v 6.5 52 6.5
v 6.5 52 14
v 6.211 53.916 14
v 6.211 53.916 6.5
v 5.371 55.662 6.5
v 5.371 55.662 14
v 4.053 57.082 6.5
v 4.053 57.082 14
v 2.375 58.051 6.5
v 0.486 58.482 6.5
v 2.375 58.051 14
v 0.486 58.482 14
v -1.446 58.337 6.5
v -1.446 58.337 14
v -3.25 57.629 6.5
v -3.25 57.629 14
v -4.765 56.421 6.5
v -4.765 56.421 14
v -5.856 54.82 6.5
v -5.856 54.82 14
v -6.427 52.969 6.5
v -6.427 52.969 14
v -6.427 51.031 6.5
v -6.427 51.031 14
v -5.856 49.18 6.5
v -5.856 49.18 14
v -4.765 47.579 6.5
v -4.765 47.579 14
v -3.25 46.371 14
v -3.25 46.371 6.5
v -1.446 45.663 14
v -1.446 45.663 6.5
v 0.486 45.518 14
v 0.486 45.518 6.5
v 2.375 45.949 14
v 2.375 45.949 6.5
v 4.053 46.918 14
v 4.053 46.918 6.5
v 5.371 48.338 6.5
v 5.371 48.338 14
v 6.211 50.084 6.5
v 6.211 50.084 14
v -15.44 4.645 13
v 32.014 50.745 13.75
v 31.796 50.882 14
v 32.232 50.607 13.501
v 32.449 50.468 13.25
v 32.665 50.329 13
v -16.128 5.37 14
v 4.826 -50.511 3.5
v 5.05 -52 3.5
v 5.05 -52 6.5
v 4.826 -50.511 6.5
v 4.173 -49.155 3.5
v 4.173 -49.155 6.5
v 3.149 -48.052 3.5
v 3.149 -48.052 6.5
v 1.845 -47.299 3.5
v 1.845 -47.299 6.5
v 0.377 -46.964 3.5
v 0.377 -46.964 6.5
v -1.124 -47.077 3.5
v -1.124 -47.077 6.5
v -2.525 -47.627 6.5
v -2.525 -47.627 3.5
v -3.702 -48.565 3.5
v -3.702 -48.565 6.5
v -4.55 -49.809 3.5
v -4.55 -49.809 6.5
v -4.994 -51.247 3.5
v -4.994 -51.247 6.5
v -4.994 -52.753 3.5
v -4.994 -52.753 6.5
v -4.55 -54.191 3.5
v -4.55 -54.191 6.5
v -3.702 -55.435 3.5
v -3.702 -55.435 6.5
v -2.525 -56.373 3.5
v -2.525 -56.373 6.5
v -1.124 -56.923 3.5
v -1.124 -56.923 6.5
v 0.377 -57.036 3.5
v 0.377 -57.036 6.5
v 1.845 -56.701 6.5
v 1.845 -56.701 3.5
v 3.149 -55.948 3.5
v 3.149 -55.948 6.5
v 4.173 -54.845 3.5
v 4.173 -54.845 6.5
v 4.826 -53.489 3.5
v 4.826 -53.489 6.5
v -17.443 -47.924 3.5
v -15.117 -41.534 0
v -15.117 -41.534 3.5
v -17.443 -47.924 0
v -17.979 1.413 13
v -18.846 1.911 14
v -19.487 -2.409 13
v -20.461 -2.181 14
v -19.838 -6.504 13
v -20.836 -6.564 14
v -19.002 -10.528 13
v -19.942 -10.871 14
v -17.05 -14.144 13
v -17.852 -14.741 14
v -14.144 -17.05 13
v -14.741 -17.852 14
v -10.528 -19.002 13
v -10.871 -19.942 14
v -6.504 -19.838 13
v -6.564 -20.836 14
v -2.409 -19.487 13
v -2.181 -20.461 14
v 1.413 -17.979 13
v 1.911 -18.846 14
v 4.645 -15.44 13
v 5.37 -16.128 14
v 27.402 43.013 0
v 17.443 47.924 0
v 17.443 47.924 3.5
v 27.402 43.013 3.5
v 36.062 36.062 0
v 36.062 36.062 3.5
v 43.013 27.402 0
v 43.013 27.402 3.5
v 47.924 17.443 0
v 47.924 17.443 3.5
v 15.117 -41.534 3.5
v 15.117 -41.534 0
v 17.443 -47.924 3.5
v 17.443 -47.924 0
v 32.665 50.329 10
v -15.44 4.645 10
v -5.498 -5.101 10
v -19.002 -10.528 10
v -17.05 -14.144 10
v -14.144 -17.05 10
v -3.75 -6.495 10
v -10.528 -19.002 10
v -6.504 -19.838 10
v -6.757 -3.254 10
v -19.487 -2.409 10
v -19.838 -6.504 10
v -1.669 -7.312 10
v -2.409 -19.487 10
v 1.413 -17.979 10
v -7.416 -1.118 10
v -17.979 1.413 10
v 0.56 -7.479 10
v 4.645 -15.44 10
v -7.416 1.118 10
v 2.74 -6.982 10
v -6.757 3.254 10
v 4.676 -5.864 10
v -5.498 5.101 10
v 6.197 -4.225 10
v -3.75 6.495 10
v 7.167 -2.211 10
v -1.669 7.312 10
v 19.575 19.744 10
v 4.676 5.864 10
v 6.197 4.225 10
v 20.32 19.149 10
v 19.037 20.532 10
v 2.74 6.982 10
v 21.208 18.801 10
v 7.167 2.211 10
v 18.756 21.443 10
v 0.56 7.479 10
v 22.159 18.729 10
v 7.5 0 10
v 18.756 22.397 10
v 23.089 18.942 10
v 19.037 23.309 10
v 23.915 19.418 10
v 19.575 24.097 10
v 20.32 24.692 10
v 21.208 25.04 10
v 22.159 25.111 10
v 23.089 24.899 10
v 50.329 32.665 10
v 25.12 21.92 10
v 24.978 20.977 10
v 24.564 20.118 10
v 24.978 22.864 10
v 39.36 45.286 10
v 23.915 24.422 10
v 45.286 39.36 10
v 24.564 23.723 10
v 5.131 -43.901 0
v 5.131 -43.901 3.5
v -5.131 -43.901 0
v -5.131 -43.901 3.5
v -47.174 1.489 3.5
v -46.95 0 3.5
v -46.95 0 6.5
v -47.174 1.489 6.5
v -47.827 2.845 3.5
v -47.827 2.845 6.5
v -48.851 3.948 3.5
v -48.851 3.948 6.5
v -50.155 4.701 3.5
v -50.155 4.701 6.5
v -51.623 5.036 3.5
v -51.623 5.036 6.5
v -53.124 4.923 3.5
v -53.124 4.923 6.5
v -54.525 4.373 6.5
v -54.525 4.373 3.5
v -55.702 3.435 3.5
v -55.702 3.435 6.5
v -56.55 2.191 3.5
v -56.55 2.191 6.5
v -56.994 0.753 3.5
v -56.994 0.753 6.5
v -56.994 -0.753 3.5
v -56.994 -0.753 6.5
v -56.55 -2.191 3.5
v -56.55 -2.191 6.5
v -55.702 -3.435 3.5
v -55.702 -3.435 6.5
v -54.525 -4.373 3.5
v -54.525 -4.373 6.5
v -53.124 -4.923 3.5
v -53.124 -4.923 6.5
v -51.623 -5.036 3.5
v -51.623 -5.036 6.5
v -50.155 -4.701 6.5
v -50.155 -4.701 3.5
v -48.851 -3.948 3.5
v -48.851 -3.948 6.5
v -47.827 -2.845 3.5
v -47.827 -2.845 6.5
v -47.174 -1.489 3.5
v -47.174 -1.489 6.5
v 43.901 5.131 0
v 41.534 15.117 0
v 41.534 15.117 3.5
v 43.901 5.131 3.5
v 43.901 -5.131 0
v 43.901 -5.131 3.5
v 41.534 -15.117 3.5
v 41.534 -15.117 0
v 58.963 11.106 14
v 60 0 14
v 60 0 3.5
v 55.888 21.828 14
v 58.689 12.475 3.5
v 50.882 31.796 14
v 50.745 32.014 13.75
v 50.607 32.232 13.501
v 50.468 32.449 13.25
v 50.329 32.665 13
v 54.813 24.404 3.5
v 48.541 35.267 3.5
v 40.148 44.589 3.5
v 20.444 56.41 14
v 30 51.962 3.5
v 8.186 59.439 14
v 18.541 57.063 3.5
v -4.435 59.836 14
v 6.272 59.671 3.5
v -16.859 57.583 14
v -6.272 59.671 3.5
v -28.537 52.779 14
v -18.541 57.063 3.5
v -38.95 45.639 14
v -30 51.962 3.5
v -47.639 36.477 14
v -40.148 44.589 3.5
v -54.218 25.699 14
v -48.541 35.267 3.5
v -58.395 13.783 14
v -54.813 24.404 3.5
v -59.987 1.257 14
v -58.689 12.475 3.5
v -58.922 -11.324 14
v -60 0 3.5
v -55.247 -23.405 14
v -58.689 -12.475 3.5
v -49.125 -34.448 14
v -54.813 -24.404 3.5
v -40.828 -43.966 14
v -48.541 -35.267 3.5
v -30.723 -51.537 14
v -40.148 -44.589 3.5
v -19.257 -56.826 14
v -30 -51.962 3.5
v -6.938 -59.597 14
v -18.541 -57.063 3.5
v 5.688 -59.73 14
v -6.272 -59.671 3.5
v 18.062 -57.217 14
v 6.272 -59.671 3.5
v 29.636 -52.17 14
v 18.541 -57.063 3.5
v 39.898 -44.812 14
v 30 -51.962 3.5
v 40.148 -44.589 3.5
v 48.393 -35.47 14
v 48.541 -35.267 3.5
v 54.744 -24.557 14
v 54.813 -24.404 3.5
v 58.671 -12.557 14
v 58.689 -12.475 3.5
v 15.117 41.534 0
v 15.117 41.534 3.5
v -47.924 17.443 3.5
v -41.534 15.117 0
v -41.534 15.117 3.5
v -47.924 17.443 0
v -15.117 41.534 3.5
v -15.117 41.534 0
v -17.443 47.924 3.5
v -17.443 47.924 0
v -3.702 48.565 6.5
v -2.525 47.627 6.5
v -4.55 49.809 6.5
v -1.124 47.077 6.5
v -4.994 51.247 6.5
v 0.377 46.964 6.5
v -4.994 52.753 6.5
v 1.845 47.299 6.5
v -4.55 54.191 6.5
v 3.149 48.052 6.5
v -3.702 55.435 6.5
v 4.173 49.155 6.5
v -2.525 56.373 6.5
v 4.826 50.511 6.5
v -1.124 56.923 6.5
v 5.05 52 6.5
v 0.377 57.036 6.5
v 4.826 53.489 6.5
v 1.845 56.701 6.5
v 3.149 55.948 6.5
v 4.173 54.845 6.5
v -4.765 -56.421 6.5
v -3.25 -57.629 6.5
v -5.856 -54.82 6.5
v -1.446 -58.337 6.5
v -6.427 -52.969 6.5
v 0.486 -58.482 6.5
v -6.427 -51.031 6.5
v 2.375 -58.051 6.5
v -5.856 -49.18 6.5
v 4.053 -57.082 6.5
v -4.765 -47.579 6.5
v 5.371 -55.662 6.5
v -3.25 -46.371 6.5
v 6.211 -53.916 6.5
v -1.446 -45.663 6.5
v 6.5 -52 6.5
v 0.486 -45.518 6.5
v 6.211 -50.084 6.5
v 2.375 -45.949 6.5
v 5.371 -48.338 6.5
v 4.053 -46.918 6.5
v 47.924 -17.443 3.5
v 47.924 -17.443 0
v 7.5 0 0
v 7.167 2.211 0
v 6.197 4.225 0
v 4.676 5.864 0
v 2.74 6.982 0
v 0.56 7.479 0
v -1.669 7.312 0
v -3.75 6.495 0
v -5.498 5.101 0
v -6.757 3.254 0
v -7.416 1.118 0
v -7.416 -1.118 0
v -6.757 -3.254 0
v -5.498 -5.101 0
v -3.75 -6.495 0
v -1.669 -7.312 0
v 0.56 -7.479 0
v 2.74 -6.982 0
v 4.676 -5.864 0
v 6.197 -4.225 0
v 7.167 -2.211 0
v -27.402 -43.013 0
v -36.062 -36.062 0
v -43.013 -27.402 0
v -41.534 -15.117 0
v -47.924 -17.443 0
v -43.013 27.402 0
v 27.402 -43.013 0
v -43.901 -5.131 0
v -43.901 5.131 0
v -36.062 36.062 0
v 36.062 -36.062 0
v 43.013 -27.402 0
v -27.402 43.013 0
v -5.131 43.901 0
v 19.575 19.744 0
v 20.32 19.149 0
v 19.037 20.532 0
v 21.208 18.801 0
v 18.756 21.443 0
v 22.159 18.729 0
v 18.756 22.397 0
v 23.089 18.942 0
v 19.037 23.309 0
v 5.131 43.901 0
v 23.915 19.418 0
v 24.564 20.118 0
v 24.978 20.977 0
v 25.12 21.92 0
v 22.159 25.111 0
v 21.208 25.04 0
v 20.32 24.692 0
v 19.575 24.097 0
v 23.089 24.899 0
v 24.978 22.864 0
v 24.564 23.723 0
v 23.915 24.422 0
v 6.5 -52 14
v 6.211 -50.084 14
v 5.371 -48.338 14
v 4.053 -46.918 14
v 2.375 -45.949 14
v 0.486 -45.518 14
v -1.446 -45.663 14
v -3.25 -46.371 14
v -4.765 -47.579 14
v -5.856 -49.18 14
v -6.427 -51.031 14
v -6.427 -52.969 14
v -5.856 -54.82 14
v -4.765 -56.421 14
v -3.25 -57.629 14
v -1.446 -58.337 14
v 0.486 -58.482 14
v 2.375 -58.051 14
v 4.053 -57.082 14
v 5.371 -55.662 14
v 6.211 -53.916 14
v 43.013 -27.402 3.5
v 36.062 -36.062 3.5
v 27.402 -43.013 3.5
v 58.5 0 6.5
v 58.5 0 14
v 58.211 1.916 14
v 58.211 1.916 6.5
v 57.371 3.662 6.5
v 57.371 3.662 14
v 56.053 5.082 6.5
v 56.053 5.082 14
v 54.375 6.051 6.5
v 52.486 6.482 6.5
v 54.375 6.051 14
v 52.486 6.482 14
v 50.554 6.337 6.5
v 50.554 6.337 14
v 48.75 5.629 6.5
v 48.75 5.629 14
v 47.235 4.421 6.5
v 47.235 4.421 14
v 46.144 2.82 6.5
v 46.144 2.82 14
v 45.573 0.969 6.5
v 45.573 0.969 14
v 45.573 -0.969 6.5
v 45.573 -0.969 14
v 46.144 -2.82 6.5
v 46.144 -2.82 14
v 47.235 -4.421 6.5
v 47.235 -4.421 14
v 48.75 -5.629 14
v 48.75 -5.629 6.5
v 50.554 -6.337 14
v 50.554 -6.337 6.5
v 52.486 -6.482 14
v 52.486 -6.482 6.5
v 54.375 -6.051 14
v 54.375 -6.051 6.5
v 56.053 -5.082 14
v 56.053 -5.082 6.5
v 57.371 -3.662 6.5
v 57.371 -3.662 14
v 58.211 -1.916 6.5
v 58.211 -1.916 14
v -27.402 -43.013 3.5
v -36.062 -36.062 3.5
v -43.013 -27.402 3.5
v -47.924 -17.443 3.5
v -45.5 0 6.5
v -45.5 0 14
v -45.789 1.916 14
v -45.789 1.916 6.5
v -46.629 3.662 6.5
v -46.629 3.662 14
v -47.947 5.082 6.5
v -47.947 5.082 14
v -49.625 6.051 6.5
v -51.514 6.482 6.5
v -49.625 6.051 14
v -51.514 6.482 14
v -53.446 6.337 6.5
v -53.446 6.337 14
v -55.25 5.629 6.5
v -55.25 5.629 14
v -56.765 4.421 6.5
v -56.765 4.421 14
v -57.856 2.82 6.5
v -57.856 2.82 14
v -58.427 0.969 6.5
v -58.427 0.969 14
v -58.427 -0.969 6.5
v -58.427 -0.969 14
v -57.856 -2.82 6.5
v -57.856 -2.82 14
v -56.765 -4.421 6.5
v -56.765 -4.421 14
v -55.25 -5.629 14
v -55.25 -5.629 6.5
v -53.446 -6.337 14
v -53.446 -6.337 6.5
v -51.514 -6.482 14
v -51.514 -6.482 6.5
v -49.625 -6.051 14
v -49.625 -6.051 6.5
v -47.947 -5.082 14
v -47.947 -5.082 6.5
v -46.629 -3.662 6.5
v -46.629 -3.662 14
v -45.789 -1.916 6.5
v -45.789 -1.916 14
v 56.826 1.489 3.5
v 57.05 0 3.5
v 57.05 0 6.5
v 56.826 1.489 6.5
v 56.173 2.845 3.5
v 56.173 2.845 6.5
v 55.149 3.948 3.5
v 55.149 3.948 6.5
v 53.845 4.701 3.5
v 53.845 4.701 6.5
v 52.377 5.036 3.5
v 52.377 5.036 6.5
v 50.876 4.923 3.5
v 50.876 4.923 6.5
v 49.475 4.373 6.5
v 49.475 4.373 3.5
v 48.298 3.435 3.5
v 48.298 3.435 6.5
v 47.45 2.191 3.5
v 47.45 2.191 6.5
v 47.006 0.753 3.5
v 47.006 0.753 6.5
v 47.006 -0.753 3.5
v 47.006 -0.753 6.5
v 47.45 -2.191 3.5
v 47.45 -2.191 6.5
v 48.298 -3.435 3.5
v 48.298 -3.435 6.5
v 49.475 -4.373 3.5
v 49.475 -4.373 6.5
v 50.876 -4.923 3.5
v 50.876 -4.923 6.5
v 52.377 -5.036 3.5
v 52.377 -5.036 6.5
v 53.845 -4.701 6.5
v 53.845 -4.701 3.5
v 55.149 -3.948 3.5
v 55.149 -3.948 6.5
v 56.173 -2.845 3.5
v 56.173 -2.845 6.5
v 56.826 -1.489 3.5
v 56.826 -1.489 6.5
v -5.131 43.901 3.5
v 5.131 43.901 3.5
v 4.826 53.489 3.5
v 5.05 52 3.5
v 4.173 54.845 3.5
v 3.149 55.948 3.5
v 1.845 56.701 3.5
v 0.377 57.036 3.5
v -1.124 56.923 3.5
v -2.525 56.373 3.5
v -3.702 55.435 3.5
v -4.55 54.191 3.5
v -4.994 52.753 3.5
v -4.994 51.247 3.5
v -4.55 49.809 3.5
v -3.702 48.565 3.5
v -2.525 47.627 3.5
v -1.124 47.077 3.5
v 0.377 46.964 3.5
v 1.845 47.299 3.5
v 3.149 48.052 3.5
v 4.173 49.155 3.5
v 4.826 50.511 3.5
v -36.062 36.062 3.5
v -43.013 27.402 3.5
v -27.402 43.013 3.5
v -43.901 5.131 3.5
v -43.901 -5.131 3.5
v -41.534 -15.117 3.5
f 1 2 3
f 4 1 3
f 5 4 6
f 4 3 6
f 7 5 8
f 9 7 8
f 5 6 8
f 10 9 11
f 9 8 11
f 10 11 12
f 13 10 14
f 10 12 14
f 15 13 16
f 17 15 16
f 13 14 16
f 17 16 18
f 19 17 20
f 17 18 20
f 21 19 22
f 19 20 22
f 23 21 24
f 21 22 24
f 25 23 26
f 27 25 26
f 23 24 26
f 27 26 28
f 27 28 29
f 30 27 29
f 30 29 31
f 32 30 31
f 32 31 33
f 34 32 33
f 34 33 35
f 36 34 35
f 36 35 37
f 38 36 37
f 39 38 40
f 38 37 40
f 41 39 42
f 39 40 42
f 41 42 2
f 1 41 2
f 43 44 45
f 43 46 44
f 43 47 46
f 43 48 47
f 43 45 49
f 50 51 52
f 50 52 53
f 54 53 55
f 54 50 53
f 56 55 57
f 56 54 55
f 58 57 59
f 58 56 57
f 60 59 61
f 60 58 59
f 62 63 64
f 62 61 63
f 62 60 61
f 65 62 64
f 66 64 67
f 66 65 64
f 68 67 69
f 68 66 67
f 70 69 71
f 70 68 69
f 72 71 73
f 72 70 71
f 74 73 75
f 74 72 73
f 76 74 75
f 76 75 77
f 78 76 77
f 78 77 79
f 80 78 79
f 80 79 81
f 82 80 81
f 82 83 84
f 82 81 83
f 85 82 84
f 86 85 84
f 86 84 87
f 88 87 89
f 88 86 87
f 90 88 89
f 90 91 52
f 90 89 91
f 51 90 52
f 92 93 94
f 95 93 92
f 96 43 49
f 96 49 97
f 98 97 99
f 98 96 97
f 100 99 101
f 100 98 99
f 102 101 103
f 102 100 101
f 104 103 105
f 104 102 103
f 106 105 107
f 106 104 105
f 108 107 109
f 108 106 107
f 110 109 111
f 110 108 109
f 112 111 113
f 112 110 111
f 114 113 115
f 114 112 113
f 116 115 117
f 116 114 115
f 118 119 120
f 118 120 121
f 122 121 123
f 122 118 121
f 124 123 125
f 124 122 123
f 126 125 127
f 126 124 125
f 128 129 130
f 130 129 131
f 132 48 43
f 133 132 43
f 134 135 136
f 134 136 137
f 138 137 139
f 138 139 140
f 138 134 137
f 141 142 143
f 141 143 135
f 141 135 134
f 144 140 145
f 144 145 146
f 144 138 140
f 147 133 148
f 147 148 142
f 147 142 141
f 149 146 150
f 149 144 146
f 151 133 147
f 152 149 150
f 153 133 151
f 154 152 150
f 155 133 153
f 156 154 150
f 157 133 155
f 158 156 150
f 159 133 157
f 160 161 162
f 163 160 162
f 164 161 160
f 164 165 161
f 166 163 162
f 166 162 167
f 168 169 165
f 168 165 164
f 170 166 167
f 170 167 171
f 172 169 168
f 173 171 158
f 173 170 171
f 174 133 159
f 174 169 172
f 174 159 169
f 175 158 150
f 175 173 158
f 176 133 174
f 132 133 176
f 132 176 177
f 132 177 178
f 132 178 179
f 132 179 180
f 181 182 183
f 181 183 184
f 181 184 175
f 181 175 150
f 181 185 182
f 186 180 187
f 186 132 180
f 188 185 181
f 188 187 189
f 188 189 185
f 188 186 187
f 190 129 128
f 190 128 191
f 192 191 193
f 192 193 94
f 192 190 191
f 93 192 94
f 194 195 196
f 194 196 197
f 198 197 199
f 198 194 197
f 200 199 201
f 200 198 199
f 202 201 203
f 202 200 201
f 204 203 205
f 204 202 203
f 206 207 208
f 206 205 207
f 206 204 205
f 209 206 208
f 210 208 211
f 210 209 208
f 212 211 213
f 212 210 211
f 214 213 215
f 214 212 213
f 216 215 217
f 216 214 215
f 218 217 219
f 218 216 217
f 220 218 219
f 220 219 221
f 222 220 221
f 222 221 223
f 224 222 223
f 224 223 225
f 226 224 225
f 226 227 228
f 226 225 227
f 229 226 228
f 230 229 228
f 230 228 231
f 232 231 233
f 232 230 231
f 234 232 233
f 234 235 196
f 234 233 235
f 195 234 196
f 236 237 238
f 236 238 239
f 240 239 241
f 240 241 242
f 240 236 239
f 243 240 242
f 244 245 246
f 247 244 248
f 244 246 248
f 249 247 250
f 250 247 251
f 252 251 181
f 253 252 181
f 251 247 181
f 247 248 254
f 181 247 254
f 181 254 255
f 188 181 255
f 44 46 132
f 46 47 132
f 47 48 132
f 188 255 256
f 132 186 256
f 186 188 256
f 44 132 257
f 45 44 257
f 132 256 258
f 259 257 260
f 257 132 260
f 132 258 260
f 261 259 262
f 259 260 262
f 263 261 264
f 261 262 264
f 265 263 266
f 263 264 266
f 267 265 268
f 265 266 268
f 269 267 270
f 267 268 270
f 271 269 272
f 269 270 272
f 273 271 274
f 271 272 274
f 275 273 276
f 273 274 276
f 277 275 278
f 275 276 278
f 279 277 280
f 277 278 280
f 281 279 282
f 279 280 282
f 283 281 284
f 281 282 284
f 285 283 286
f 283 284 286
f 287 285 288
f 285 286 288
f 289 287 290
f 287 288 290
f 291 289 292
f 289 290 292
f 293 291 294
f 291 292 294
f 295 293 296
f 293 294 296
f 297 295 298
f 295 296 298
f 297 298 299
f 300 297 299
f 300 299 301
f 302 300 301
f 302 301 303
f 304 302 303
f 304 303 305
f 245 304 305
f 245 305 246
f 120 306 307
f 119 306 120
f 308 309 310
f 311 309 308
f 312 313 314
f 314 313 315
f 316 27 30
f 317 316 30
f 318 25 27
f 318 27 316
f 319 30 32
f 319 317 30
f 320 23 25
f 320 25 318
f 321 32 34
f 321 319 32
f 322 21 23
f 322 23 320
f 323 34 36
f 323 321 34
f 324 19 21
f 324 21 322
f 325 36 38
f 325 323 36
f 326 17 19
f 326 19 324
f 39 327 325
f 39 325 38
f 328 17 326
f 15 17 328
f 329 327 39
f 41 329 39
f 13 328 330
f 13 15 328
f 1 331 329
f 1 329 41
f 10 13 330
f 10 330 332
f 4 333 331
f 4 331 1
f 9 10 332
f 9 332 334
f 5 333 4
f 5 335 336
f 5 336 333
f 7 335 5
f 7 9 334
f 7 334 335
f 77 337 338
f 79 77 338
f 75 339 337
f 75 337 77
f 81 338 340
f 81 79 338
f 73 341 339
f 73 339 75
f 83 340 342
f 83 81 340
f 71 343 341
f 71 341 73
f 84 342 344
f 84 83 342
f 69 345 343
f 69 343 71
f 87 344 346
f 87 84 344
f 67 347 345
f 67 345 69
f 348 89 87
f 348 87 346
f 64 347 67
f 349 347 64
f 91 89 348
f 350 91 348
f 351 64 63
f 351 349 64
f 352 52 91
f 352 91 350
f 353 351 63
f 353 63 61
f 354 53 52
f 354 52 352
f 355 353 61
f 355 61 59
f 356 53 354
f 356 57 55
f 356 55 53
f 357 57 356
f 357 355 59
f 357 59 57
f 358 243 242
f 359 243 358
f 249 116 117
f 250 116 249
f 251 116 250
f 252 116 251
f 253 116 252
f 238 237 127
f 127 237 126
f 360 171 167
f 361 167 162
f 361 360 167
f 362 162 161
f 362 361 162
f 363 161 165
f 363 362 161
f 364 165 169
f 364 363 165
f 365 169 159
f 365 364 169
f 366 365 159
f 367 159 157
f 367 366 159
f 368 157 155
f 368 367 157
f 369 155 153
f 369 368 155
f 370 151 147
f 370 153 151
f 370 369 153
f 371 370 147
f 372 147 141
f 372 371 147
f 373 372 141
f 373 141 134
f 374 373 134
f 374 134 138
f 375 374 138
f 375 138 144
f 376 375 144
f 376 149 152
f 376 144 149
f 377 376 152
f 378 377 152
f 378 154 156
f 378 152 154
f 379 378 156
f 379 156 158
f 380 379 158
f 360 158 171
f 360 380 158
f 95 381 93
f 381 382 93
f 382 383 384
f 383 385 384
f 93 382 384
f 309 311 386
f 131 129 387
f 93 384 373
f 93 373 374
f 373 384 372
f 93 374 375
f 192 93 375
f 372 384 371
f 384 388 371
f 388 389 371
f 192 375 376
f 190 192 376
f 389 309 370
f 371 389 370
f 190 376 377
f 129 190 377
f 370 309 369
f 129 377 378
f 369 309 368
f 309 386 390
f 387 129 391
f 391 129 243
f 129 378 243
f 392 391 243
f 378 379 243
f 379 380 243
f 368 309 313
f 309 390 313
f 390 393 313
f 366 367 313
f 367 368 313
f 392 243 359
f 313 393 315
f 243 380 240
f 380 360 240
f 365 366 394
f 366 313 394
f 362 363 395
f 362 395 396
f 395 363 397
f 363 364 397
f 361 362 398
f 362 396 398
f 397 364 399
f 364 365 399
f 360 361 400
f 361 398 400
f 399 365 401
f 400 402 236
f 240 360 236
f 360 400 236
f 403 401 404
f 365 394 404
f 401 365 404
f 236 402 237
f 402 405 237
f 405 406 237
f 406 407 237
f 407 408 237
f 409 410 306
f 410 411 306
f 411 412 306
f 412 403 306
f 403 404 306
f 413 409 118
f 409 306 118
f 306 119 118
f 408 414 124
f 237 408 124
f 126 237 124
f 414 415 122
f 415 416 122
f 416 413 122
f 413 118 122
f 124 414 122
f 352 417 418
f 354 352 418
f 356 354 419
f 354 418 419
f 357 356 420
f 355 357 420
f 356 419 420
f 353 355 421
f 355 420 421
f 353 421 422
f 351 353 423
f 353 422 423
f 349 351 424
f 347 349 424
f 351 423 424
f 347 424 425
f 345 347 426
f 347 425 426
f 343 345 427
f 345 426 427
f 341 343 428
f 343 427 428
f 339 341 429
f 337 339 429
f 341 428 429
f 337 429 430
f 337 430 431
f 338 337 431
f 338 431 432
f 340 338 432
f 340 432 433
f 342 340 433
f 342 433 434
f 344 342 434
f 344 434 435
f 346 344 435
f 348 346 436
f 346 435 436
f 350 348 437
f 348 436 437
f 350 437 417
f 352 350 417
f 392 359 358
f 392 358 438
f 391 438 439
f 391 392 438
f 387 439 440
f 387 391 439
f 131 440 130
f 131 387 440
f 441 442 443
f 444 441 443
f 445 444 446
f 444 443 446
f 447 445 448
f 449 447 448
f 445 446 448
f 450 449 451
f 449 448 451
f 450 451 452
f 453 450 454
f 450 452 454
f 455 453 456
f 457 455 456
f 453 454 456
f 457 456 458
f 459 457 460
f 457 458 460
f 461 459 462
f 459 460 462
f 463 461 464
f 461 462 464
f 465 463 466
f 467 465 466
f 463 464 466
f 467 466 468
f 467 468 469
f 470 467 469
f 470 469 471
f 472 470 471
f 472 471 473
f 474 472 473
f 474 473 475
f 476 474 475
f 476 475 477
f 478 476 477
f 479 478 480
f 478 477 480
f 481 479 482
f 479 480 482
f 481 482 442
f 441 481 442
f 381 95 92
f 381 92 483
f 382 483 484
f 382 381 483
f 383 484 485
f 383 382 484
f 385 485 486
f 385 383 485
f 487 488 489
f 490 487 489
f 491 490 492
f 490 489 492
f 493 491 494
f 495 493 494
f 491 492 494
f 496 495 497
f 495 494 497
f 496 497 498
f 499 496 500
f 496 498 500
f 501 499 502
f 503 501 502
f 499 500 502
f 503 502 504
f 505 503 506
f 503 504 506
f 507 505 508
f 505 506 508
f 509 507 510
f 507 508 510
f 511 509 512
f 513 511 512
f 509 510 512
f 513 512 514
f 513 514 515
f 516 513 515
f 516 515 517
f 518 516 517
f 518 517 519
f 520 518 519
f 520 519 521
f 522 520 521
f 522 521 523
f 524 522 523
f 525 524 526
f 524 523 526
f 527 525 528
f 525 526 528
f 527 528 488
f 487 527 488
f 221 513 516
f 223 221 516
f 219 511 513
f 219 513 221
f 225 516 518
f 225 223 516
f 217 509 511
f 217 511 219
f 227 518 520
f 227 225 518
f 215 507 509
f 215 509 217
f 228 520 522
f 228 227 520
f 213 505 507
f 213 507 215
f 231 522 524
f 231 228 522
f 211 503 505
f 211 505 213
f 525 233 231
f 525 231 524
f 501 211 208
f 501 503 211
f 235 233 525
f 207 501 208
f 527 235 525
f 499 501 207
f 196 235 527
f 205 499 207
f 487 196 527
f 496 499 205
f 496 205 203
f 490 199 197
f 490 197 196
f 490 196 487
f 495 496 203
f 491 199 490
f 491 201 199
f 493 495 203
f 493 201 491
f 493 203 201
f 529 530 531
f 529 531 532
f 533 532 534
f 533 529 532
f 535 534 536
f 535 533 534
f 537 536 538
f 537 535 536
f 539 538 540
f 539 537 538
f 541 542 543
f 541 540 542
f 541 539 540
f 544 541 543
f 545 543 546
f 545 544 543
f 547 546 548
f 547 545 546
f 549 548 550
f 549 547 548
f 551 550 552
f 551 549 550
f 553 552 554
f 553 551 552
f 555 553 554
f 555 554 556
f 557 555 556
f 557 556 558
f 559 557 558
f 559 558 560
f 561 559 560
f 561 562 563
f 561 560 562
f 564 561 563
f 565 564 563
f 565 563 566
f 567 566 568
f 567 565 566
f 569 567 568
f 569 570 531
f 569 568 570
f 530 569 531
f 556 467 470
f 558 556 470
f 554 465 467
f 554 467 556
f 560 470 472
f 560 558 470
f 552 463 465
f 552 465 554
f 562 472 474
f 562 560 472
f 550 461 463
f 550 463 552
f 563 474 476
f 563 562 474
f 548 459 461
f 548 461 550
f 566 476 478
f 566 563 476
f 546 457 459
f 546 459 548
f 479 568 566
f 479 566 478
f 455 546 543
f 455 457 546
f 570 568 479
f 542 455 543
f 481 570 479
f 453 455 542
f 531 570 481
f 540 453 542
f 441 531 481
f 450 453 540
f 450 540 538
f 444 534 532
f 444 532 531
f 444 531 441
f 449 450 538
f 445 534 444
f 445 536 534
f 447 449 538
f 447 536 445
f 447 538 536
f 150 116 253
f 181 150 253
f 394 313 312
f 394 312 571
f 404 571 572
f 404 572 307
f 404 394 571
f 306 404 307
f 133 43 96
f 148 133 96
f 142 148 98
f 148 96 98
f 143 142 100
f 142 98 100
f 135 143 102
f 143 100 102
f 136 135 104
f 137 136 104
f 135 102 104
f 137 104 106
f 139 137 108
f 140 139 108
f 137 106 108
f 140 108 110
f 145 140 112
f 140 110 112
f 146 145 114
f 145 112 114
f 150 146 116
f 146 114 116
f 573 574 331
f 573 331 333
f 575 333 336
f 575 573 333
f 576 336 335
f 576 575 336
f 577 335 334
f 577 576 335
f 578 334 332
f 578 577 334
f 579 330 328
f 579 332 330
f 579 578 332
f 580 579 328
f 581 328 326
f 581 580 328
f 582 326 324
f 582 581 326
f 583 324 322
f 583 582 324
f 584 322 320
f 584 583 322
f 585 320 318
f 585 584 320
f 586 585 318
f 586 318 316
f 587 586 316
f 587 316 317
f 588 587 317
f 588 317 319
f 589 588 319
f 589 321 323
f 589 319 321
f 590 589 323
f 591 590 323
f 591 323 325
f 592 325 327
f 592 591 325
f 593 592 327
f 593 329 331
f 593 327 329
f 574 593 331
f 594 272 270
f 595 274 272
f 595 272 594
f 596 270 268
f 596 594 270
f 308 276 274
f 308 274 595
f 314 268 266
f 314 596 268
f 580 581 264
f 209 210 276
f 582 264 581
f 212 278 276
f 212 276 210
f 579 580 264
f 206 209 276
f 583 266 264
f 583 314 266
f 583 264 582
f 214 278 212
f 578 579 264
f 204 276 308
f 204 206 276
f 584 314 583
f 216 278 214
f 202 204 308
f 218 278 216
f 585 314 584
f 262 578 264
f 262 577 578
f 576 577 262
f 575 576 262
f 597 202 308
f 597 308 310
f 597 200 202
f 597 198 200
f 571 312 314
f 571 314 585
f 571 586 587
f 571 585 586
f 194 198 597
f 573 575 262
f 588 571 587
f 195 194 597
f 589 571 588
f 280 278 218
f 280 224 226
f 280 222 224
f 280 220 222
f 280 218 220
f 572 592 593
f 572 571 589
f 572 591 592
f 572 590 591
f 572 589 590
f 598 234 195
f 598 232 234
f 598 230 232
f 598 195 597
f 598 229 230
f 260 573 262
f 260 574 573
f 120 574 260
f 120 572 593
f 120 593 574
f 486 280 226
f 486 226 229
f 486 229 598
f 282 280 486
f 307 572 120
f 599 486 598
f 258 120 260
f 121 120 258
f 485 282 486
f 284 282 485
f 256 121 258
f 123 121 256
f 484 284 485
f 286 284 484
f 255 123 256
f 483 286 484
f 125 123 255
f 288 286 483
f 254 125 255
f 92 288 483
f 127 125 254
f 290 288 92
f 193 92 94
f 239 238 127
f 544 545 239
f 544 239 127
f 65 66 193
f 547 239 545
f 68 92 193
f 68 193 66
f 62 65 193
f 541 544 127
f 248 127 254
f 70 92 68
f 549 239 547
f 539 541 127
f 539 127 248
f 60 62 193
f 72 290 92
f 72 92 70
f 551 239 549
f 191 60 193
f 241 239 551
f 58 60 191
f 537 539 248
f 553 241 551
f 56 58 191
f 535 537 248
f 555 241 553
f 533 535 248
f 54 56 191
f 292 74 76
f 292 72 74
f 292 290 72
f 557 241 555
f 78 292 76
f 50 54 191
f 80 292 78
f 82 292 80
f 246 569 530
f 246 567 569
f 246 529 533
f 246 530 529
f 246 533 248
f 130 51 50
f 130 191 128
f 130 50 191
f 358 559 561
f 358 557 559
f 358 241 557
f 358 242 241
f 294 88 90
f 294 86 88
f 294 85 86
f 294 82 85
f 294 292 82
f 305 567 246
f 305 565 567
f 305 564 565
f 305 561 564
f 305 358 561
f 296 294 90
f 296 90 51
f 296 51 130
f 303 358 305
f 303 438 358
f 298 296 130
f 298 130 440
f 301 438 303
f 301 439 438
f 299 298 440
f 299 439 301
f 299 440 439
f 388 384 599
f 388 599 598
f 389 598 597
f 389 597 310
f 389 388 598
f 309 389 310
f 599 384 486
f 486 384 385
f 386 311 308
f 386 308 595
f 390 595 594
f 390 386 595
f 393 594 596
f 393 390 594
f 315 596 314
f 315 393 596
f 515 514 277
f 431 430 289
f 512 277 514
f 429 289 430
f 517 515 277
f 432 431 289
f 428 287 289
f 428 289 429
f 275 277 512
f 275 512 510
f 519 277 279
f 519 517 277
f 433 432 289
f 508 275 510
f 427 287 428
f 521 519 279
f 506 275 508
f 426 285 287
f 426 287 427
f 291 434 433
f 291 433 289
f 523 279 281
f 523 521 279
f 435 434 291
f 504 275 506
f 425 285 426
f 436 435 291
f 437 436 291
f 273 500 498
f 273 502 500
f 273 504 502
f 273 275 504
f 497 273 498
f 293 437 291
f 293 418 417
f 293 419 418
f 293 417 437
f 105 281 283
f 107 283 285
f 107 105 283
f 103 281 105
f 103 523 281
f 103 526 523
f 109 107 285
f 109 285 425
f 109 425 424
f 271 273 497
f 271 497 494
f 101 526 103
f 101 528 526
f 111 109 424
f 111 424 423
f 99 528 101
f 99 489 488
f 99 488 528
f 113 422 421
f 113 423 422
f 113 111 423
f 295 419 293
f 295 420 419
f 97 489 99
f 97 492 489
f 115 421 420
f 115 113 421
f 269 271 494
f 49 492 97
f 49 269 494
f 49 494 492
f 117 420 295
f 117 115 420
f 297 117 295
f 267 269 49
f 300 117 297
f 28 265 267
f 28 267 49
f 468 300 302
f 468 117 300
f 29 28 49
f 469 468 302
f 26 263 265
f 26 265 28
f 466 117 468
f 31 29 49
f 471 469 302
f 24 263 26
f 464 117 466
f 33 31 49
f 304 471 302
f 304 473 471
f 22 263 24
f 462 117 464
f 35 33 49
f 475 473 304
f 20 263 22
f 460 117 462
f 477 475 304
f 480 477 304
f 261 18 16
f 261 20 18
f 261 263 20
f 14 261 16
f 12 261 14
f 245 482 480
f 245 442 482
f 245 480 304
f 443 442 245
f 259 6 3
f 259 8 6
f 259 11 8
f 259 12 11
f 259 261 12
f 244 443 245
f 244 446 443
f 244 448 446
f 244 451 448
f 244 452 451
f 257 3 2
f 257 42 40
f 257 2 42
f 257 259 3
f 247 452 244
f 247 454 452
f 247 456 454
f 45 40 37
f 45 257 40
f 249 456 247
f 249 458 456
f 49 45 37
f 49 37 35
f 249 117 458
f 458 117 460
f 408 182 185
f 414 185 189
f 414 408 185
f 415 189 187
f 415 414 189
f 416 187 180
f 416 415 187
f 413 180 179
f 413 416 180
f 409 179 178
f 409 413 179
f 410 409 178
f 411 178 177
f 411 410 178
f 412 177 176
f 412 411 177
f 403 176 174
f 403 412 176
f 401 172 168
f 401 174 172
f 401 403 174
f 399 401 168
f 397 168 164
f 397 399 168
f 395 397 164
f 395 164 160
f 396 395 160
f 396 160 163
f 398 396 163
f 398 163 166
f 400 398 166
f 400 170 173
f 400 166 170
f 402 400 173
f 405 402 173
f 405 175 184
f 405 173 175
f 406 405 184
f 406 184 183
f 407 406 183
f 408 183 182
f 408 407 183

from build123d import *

# Parameters (mm, degrees)
SKETCH_R        = 60
SKETCH_R_2      = 7.5
SKETCH_R_3      = 3.2
SKETCH_R_4      = 5.05
PAD_DEPTH       = 14
SKETCH001_R     = 70
POCKET_DEPTH    = 3.5
POCKET001_DEPTH = 4
SKETCH003_R     = 6.5
POCKET002_DEPTH = 7.5
CHAMFER_SIZE    = 1


with BuildPart() as part:
    # Sketch → Pad (new body)
    with BuildSketch(Plane.XY):
        Circle(SKETCH_R)
        Circle(SKETCH_R_2, mode=Mode.SUBTRACT)
        with Locations((21.92031, 21.92031)):
            Circle(SKETCH_R_3, mode=Mode.SUBTRACT)
        with Locations((-52, 0)):
            Circle(SKETCH_R_4, mode=Mode.SUBTRACT)
        with Locations((52, 0)):
            Circle(SKETCH_R_4, mode=Mode.SUBTRACT)
        with Locations((0, 52)):
            Circle(SKETCH_R_4, mode=Mode.SUBTRACT)
        with Locations((0, -52)):
            Circle(SKETCH_R_4, mode=Mode.SUBTRACT)
    extrude(amount=PAD_DEPTH)

    # Sketch001 → Pocket (cut)
    with BuildSketch(Plane(origin=(0, 0, 0), x_dir=(1, 0, 0), z_dir=(0, 0, -1))):
        Circle(SKETCH001_R)
        with BuildLine():
            ThreePointArc((-41.534414, 15.11729), (-44.2, 0), (-41.534414, -15.11729))
            Line((-41.534414, -15.11729), (-47.924324, -17.443027))
            ThreePointArc((-47.924324, -17.443027), (-36.062446, -36.062446), (-17.443027, -47.924324))
            Line((-15.11729, -41.534414), (-17.443027, -47.924324))
            ThreePointArc((-15.11729, -41.534414), (0, -44.2), (15.11729, -41.534414))
            Line((15.11729, -41.534414), (17.443027, -47.924324))
            ThreePointArc((17.443027, -47.924324), (36.062446, -36.062446), (47.924324, -17.443027))
            Line((41.534414, -15.11729), (47.924324, -17.443027))
            ThreePointArc((41.534414, -15.11729), (44.2, 0), (41.534414, 15.11729))
            Line((41.534414, 15.11729), (47.924324, 17.443027))
            ThreePointArc((47.924324, 17.443027), (36.062446, 36.062446), (17.443027, 47.924324))
            Line((15.11729, 41.534414), (17.443027, 47.924324))
            ThreePointArc((15.11729, 41.534414), (0, 44.2), (-15.11729, 41.534414))
            Line((-15.11729, 41.534414), (-17.443027, 47.924324))
            ThreePointArc((-17.443027, 47.924324), (-36.062446, 36.062446), (-47.924324, 17.443027))
            Line((-41.534414, 15.11729), (-47.924324, 17.443027))
        make_face(mode=Mode.SUBTRACT)
    extrude(amount=-POCKET_DEPTH, mode=Mode.SUBTRACT)

    # Sketch002 → Pocket001 (cut)
    with BuildSketch(Plane.XY.offset(14)):
        with BuildLine():
            Line((4.644542, -15.439722), (81.321028, 65.300484))
            Line((81.321028, 65.300484), (64.32339, 80.393113))
            Line((64.32339, 80.393113), (-15.439722, 4.644542))
            ThreePointArc((-15.439722, 4.644542), (-15.702333, -15.702333), (4.644542, -15.439722))
        make_face()
    extrude(amount=-POCKET001_DEPTH, mode=Mode.SUBTRACT)

    # Sketch003 → Pocket002 (cut)
    with BuildSketch(Plane.XY.offset(14)):
        with Locations((0, 52)):
            Circle(SKETCH003_R)
        with Locations((52, 0)):
            Circle(SKETCH003_R)
        with Locations((0, -52)):
            Circle(SKETCH003_R)
        with Locations((-52, 0)):
            Circle(SKETCH003_R)
    extrude(amount=-POCKET002_DEPTH, mode=Mode.SUBTRACT)

    # Chamfer
    chamfer_edges = [part.edges().sort_by_distance(p)[0] for p in [
        (8.612883, 27.486561, 14),
    ]]
    chamfer(chamfer_edges, length=CHAMFER_SIZE)


solid = part.part
